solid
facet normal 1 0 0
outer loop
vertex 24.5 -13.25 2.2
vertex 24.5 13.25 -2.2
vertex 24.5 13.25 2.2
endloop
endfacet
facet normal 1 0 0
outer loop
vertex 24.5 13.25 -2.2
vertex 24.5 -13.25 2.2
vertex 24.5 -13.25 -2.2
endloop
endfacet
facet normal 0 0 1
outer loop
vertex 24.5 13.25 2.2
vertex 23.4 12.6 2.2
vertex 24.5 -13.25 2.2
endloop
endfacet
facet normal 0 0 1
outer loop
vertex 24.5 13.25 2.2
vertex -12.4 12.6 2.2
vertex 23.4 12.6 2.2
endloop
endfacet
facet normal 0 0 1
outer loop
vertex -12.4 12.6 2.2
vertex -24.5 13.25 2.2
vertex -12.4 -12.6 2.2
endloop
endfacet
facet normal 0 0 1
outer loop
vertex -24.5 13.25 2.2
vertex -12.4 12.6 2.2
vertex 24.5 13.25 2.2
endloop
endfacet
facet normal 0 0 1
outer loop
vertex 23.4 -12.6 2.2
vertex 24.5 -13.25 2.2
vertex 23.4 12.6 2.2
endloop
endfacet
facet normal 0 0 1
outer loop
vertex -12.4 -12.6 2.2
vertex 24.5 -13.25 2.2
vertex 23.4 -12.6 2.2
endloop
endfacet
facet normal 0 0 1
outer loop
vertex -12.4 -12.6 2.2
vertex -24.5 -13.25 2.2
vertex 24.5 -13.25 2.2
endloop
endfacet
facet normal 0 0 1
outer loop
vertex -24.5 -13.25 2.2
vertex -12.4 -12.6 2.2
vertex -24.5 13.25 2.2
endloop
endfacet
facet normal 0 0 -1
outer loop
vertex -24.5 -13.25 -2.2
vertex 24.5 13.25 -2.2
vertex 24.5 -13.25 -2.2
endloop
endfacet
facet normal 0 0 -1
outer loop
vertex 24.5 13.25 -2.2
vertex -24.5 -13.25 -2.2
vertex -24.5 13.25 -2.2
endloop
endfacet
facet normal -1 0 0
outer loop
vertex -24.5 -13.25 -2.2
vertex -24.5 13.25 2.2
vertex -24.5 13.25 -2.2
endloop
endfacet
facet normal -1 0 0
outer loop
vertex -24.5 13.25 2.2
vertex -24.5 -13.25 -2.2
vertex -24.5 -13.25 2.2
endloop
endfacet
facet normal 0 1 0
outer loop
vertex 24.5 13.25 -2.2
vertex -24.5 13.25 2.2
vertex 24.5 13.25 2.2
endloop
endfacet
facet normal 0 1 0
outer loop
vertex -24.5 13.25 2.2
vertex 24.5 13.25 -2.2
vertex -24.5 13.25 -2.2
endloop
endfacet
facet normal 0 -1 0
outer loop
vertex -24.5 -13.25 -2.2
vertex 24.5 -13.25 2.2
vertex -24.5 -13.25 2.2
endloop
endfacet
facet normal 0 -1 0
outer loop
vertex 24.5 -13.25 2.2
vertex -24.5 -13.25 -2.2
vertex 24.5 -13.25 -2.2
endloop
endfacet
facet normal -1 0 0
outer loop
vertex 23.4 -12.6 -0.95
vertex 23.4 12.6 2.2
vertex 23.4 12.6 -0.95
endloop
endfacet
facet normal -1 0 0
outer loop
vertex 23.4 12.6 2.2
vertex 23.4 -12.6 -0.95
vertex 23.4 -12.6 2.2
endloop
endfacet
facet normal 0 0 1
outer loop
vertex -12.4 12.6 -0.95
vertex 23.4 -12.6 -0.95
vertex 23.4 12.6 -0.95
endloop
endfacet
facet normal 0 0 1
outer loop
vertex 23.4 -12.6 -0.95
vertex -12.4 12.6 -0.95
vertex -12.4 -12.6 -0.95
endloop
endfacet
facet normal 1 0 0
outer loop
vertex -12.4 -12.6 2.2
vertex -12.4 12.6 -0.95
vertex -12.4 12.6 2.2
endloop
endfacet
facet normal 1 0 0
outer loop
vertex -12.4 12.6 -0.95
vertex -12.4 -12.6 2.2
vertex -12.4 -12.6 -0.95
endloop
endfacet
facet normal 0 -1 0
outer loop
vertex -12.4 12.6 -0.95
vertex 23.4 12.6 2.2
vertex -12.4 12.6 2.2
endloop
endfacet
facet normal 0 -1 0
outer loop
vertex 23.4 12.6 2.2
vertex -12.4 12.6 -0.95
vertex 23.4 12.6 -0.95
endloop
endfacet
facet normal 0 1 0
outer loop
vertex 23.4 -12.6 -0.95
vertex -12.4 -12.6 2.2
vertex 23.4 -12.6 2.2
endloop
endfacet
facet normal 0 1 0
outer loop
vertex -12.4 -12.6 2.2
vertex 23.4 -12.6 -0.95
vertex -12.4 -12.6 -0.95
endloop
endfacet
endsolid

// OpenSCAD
difference(){
    cube([49,26.5,4.4],center=true);
    translate([5.5,0,0.8])cube([35.8,25.2,3.5],center=true);
}
